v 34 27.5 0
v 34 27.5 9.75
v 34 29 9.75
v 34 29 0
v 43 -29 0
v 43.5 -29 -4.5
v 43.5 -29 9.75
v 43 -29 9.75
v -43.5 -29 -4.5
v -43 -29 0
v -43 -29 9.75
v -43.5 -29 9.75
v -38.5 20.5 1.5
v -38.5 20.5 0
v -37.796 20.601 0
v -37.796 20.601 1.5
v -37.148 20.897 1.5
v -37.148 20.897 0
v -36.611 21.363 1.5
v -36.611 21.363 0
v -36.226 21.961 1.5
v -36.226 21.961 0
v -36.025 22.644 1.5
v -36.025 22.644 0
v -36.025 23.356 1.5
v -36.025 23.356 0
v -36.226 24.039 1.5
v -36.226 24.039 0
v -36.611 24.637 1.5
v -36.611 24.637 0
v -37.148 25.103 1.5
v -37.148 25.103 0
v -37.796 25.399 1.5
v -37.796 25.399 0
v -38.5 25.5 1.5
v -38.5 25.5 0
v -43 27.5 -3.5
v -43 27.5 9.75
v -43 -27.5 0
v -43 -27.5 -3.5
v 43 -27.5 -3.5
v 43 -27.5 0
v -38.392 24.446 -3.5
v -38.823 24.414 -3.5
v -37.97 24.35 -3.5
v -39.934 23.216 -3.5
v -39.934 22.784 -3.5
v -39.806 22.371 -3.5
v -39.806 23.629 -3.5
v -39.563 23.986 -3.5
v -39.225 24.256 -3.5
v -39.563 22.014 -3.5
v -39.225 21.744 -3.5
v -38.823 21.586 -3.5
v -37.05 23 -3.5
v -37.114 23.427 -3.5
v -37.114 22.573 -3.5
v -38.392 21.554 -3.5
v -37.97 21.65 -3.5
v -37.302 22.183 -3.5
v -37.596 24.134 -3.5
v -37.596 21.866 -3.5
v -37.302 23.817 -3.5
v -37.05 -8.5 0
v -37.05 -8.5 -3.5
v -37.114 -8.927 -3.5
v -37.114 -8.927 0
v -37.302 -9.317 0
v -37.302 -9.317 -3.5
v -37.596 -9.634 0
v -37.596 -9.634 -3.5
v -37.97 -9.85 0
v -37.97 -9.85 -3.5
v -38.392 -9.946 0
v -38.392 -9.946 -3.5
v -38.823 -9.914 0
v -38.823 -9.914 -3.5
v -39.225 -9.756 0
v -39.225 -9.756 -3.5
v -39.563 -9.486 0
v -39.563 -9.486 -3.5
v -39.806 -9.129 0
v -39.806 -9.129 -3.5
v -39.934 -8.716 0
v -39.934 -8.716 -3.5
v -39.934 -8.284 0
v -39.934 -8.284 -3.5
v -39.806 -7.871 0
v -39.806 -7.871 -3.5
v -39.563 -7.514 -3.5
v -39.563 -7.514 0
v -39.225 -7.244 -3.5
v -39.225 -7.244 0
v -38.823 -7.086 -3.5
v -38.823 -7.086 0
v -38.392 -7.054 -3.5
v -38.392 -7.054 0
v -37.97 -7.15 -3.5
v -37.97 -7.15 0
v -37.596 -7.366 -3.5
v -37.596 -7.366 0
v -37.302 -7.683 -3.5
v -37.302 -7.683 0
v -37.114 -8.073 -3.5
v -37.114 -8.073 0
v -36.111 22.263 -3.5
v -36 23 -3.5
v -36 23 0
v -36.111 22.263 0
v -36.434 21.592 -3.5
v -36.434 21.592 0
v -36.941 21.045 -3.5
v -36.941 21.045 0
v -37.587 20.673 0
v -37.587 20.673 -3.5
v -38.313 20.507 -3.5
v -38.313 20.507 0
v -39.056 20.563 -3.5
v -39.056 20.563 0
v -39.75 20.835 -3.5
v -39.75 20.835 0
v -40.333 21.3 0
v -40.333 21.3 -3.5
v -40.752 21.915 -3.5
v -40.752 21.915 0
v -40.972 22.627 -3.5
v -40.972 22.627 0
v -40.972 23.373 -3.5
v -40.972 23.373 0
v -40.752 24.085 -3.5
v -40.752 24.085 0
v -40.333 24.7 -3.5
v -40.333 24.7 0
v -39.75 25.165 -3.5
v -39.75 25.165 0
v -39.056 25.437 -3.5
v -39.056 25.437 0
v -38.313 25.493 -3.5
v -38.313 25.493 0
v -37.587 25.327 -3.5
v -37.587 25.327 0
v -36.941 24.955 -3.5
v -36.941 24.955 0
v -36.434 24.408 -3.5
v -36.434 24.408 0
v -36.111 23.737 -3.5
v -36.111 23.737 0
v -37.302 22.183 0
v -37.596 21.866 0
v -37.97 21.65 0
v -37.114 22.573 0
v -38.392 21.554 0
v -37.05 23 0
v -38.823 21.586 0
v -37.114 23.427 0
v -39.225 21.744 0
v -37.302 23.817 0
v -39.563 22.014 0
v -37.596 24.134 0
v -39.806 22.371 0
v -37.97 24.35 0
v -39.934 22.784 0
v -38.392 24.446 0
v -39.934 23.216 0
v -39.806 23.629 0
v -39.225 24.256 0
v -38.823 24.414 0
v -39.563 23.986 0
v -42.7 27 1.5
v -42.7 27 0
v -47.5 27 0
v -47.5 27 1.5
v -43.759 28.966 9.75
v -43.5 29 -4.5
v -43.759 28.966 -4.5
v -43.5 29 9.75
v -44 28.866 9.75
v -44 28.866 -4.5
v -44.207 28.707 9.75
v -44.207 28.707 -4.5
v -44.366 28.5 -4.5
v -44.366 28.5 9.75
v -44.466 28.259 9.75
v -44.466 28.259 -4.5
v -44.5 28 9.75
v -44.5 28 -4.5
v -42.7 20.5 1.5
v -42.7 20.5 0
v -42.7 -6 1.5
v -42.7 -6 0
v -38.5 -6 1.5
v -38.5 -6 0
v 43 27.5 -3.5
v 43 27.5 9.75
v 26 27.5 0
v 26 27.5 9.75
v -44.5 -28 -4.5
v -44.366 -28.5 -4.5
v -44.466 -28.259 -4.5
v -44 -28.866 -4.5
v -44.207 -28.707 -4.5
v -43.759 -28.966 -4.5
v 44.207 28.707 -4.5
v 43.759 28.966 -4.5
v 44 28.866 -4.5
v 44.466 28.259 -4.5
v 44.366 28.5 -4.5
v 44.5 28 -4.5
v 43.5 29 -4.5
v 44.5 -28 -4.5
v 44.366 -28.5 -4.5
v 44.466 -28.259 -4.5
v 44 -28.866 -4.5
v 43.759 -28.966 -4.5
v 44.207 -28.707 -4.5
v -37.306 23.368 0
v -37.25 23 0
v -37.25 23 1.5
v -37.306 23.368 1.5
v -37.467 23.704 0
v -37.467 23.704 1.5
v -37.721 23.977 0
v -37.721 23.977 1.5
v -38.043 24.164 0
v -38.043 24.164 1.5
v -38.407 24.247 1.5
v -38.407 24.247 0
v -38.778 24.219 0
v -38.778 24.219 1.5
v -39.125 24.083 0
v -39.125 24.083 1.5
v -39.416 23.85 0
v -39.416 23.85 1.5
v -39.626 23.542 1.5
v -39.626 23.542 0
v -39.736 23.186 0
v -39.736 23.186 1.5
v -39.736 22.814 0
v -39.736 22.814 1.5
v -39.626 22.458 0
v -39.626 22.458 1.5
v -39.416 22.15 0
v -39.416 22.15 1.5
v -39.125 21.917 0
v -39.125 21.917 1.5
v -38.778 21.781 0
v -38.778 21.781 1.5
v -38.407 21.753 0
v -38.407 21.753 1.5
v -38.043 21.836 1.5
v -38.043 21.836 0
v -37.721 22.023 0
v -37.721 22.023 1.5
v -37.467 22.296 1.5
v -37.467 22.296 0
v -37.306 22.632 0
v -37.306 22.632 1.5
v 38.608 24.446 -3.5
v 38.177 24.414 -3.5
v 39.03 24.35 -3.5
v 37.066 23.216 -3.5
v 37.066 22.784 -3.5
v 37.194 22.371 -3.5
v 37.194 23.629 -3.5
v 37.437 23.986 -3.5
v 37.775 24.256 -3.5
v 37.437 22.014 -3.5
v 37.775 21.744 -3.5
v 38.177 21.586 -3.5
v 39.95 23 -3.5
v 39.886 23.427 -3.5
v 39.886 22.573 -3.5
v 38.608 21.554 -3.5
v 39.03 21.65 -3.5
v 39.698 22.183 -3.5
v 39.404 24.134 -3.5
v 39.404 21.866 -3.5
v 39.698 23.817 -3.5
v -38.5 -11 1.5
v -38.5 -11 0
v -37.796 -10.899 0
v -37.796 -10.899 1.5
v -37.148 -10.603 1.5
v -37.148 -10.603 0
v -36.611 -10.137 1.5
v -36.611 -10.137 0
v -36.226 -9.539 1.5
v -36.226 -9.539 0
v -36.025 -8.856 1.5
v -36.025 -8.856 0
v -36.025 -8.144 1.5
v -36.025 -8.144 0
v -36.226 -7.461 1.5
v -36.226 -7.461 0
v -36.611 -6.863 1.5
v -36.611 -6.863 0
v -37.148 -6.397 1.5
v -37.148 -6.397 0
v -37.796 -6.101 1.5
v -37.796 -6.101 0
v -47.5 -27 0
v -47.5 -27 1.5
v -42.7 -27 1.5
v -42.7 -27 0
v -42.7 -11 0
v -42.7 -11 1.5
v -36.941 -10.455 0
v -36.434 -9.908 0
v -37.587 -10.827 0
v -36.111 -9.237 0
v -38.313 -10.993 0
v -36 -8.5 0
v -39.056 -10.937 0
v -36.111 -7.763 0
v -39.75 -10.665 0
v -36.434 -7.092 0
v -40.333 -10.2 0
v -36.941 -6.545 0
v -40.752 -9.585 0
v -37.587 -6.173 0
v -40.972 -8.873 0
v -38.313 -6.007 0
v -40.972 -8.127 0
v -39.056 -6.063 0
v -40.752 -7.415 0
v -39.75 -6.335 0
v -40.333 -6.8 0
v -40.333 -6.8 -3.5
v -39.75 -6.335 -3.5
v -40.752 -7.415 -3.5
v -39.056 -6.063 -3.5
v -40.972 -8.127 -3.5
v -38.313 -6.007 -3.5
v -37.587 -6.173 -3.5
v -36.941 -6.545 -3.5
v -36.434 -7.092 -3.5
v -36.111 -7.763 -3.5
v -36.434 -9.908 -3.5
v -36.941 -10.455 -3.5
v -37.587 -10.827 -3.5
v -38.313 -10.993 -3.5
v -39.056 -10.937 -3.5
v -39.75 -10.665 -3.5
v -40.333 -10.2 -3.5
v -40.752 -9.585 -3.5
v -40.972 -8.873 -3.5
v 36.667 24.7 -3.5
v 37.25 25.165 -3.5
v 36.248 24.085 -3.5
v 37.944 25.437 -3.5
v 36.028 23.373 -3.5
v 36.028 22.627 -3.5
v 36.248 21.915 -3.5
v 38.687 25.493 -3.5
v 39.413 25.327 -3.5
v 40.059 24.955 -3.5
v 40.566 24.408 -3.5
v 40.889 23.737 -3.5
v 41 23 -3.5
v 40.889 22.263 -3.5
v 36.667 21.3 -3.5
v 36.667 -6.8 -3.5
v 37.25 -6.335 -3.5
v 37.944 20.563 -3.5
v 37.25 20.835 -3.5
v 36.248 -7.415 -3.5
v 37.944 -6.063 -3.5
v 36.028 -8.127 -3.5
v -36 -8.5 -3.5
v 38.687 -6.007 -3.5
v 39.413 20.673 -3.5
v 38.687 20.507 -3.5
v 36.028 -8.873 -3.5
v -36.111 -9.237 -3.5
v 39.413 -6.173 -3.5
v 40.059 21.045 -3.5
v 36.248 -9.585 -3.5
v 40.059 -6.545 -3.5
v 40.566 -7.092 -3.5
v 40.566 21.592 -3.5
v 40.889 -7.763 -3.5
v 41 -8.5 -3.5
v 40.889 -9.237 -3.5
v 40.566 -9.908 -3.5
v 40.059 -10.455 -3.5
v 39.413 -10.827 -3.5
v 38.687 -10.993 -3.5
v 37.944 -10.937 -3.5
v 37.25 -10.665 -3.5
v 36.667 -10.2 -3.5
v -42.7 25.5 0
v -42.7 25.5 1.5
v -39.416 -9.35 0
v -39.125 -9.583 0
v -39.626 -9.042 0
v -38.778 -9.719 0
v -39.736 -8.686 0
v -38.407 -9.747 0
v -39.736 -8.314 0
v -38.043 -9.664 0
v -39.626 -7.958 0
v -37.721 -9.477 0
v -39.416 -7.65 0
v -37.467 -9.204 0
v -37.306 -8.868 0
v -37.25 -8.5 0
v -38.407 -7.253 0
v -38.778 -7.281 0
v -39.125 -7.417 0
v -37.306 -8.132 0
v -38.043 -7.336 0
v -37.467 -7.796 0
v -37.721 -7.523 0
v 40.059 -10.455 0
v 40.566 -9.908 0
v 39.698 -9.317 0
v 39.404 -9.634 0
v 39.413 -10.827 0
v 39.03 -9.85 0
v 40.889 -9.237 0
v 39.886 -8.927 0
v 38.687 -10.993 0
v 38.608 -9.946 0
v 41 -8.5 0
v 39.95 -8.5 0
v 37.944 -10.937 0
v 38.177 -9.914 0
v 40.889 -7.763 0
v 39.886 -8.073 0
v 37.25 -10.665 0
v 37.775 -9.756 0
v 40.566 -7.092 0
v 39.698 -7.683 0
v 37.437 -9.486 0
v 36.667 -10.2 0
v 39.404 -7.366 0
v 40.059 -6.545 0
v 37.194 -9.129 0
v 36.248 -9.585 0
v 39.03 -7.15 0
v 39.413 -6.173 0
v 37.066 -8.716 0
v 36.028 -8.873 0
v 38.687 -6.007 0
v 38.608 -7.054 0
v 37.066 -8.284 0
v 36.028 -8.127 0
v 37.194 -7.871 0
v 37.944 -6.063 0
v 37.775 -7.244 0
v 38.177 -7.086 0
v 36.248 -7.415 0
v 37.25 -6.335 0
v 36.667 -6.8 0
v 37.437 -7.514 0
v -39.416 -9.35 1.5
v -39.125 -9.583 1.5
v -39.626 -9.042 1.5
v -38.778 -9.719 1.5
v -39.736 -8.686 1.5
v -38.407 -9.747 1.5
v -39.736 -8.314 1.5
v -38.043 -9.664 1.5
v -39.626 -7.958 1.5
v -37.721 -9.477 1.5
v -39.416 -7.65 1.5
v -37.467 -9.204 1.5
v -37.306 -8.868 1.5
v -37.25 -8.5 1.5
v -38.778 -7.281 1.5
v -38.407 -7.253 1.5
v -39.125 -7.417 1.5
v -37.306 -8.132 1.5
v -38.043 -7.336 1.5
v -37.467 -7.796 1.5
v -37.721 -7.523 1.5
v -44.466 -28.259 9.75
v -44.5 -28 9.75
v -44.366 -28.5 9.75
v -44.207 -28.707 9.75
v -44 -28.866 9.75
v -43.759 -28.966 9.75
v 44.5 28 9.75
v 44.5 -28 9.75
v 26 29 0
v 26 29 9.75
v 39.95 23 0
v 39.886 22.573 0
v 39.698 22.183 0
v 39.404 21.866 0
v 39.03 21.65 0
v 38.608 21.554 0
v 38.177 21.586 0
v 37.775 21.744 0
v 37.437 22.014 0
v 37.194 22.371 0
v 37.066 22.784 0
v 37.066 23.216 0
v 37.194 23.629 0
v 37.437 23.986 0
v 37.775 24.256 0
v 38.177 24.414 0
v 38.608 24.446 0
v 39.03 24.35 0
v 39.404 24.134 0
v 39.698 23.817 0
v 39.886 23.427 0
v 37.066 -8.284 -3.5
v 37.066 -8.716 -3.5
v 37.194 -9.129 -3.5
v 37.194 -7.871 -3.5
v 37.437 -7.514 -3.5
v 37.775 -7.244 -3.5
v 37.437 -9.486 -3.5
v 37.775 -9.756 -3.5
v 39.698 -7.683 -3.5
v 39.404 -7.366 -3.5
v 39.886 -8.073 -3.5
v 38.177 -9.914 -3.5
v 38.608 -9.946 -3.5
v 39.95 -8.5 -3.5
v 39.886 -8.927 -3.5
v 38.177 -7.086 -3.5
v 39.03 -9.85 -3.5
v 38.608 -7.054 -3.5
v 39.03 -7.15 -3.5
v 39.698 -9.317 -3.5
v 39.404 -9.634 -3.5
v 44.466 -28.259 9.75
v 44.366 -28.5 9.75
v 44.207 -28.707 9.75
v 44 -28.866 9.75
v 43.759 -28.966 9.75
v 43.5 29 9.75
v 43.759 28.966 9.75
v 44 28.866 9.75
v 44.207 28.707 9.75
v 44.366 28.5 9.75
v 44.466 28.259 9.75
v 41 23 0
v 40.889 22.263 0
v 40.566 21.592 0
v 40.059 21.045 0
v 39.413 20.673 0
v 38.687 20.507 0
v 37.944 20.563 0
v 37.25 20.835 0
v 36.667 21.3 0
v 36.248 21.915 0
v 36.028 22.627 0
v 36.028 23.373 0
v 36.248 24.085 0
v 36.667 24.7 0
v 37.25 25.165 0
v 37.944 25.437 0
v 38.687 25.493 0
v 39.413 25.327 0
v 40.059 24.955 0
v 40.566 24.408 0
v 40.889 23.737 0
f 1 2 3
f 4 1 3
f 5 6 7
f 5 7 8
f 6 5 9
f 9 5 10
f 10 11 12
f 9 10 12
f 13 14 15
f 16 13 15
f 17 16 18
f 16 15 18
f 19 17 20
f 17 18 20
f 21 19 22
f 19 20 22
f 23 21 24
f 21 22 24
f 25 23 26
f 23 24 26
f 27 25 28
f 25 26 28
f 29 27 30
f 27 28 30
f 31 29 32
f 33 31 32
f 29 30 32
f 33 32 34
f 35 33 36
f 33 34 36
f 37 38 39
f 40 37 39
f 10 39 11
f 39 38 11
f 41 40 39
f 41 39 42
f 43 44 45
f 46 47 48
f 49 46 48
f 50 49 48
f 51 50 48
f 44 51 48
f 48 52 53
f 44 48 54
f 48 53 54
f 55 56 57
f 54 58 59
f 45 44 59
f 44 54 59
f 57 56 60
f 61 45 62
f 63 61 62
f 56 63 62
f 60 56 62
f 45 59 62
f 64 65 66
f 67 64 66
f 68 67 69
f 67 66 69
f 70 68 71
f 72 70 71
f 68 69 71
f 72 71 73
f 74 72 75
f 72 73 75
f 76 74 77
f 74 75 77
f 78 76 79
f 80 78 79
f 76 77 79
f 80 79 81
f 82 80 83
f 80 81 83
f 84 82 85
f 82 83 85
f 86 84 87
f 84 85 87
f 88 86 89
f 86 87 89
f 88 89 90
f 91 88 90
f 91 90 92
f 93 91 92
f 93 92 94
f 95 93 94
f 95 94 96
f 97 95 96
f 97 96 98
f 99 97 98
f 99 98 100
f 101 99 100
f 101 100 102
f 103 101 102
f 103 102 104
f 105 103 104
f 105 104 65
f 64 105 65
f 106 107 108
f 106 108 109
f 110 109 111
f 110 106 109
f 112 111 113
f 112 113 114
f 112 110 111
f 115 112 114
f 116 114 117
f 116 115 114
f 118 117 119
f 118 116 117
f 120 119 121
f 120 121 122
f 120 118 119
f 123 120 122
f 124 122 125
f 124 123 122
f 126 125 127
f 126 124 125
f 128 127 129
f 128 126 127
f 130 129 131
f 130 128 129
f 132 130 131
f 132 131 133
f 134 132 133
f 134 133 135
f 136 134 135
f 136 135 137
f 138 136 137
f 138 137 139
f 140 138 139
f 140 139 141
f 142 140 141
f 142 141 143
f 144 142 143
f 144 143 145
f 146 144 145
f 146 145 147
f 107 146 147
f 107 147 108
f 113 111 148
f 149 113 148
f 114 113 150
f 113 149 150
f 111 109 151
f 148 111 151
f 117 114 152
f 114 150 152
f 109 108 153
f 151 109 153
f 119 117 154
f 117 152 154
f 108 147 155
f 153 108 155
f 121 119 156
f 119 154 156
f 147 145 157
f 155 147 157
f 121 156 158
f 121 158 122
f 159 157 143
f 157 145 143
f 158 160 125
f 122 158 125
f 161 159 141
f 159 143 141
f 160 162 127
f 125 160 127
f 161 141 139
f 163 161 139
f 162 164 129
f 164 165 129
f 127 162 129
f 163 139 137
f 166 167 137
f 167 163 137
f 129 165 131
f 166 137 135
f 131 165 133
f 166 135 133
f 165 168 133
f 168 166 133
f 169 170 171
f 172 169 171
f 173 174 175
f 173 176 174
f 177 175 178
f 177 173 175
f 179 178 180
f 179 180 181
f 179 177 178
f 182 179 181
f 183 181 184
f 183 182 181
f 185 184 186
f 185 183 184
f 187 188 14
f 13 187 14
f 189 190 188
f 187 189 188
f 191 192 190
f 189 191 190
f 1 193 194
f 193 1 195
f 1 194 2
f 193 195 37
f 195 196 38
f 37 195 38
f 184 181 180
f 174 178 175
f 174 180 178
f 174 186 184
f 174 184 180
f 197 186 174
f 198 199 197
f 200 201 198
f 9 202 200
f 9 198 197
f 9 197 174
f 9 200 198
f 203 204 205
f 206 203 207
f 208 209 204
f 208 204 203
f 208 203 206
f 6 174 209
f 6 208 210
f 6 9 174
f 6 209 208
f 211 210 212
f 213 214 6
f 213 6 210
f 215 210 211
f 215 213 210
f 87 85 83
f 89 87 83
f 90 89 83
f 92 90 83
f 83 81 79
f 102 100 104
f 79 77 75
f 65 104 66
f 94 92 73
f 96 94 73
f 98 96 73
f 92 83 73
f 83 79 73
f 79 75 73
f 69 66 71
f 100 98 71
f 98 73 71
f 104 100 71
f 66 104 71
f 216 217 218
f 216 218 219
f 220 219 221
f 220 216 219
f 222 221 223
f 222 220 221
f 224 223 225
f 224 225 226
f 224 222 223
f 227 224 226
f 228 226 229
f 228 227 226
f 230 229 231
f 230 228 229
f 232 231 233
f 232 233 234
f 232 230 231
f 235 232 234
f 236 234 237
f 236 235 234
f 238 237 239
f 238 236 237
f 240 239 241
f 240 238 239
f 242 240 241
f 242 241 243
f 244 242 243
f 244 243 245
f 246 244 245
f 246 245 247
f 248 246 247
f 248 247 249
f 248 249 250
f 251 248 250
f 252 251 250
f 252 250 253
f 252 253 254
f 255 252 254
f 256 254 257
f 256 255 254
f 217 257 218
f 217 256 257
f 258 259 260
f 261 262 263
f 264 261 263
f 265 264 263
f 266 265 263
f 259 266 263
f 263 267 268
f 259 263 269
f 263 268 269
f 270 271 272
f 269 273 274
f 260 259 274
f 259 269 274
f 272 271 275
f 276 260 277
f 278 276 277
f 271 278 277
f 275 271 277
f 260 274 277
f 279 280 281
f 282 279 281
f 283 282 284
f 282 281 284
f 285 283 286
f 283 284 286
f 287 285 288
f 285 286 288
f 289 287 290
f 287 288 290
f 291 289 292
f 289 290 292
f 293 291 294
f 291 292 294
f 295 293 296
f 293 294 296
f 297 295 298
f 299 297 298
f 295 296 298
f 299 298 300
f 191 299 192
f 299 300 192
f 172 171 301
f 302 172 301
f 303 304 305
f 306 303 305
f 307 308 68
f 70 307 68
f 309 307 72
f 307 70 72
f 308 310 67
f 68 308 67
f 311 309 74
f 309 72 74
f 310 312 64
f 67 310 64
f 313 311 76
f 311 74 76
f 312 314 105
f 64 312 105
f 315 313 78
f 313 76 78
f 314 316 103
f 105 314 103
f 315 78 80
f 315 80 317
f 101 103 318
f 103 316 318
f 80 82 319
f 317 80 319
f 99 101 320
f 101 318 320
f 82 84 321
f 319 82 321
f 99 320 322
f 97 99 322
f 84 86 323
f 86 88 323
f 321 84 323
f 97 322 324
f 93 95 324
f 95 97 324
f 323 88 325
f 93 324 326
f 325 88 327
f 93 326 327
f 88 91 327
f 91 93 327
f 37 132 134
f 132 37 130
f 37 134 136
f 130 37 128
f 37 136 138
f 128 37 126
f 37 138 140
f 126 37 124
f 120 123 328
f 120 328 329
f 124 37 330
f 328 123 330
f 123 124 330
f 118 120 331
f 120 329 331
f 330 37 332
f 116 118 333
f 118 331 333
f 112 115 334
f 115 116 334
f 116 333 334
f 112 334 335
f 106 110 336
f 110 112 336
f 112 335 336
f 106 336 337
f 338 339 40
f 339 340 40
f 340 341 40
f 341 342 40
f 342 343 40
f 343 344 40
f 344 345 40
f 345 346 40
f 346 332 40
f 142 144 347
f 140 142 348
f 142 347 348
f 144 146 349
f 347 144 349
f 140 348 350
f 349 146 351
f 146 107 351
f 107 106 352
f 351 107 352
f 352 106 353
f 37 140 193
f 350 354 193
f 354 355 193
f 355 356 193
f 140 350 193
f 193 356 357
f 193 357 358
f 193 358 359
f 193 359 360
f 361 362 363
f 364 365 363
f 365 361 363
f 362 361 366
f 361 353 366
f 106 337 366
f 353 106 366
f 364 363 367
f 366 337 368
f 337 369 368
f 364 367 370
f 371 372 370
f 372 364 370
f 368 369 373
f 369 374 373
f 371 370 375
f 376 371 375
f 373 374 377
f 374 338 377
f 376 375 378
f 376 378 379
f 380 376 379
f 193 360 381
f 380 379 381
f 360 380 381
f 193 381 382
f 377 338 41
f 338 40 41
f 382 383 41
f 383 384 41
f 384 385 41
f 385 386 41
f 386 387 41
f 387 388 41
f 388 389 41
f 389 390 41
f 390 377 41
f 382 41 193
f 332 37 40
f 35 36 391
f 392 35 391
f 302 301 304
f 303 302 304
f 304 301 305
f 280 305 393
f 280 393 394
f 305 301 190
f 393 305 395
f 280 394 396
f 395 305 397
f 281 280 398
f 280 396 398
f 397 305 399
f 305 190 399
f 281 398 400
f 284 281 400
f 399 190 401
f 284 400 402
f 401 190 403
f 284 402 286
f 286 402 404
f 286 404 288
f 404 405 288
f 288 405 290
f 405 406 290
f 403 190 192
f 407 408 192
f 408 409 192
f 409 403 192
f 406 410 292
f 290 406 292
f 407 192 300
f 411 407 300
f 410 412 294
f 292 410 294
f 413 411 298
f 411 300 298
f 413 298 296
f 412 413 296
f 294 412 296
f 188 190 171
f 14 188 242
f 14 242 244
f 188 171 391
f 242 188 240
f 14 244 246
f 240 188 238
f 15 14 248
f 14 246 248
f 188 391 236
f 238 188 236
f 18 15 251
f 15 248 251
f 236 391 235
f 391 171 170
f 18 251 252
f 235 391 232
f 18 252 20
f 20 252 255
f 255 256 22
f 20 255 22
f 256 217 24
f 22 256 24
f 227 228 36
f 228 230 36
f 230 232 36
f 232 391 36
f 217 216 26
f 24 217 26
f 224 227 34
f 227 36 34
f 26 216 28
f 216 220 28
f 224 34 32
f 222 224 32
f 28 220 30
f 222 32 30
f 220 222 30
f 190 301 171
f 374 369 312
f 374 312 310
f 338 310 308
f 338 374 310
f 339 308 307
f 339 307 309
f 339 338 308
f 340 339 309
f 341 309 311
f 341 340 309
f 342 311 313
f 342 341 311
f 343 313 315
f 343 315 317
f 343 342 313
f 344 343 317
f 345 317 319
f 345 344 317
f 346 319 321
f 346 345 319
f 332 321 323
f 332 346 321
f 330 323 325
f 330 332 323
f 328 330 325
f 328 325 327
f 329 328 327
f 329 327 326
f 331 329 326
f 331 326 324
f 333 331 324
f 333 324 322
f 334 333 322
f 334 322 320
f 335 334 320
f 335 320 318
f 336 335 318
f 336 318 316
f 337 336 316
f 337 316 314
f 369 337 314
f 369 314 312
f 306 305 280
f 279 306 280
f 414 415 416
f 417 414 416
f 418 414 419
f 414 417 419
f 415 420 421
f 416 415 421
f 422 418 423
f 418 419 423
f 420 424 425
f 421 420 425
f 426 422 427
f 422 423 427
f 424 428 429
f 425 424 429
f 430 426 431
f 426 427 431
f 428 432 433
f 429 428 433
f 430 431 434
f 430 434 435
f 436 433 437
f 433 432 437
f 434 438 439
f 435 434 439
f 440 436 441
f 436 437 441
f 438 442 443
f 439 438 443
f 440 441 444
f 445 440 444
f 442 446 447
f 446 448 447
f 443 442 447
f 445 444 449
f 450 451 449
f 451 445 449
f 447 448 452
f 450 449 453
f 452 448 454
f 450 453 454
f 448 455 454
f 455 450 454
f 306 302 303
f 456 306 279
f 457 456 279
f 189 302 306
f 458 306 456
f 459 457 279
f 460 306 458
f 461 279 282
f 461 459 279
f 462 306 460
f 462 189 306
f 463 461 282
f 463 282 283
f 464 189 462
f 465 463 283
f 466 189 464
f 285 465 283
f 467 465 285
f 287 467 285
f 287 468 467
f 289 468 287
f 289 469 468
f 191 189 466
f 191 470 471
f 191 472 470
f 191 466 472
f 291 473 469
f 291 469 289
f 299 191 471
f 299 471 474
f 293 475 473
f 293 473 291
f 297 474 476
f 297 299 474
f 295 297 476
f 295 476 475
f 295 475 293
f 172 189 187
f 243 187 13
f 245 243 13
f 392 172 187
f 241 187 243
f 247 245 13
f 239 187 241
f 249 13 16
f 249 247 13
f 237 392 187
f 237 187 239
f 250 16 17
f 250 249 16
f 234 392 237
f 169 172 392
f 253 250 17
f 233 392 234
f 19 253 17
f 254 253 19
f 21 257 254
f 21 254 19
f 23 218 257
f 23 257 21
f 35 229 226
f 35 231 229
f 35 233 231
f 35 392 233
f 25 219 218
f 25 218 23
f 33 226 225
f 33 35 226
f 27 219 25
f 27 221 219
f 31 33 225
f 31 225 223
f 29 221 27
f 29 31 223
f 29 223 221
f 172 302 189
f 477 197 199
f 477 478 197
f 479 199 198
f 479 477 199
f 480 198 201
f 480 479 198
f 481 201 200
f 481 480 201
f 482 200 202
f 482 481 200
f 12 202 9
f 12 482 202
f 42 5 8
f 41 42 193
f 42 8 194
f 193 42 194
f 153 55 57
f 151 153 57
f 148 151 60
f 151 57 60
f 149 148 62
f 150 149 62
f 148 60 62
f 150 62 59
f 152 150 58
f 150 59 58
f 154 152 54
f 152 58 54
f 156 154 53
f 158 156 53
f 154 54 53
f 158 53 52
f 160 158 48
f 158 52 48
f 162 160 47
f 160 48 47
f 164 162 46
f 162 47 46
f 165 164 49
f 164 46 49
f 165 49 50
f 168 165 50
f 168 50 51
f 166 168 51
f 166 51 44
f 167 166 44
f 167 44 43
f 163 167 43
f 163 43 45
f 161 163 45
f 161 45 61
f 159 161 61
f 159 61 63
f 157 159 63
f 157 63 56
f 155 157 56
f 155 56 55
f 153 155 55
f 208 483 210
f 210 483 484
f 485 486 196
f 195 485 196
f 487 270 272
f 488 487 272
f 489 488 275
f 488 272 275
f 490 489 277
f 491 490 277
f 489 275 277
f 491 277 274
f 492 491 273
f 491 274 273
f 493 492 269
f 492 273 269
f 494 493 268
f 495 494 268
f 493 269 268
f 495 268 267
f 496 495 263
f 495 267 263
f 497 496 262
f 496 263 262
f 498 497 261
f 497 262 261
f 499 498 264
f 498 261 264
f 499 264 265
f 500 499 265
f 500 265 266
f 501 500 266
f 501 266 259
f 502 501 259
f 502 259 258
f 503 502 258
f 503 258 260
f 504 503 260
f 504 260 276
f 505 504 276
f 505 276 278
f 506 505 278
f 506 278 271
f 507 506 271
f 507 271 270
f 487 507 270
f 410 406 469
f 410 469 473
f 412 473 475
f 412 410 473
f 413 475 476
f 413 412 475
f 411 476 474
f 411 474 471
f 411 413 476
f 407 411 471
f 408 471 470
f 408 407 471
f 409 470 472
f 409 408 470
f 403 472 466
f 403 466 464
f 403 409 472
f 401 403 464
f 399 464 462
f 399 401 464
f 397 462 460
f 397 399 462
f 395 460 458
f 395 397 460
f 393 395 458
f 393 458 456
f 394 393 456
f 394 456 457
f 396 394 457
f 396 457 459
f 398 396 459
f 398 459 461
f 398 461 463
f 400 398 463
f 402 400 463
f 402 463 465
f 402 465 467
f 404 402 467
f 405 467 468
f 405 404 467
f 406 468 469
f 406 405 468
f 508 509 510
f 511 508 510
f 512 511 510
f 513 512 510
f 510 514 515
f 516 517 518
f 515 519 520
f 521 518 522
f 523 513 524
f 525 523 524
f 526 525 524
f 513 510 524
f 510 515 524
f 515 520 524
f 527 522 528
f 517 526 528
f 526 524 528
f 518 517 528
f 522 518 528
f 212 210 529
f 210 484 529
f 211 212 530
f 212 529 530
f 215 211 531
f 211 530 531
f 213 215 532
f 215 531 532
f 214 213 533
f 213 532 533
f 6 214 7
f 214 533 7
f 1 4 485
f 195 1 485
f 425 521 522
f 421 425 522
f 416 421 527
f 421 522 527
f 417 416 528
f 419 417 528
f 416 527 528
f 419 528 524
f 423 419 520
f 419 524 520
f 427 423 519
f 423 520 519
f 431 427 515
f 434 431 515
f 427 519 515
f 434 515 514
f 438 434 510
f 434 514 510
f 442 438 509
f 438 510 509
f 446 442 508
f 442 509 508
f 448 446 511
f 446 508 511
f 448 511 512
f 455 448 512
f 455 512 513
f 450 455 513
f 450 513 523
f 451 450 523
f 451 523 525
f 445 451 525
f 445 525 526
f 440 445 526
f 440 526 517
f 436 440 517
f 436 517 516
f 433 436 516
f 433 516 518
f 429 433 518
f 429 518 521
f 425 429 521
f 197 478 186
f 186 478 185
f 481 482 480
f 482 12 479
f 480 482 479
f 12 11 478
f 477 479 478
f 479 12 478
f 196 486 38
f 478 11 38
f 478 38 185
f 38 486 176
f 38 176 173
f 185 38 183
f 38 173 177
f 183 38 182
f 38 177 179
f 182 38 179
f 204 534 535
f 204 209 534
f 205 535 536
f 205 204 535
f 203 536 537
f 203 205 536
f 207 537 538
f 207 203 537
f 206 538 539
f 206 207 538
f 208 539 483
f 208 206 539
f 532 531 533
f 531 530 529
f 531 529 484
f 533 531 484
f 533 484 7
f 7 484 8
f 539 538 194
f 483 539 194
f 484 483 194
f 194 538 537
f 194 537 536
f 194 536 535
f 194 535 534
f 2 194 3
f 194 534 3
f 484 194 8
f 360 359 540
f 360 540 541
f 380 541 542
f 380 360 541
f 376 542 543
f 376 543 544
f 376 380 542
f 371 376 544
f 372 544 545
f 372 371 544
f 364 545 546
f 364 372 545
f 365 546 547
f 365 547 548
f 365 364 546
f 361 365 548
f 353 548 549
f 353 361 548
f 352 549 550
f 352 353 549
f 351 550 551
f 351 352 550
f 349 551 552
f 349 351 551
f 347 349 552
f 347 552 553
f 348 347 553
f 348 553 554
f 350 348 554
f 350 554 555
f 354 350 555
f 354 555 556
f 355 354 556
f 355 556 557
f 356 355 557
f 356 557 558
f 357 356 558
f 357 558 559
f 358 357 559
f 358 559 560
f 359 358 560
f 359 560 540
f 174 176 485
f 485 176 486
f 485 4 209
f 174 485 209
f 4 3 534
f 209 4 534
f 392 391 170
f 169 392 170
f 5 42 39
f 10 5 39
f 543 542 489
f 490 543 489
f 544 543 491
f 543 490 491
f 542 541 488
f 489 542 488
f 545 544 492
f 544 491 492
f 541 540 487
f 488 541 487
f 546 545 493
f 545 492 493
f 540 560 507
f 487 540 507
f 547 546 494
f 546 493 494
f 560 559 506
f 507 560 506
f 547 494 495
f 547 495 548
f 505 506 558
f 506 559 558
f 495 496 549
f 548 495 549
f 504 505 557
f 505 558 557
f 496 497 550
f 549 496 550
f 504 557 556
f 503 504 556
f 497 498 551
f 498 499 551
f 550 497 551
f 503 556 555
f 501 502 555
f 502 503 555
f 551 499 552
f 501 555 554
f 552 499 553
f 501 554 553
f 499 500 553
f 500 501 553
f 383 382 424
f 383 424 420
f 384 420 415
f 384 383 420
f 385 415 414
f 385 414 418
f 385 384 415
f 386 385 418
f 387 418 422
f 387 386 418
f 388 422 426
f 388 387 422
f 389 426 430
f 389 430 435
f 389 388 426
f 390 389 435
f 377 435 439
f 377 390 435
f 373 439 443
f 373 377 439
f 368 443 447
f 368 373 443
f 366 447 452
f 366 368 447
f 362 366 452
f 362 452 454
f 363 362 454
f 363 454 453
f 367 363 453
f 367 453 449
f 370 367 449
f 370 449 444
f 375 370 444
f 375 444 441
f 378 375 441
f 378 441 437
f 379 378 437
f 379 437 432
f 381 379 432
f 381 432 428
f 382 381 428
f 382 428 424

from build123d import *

# Parameters (mm, degrees)
F2_W      = 86
F2_H      = 1.5
F2_W_2    = 8
F3_DEPTH  = 1
F5_R      = 2.5
F5_R_2    = 1.45
F8_R      = 1
F9_R      = 1.25
F10_DEPTH = 1.5


with BuildPart() as f3:
    # F2 (on line) → F3 (new body)
    with BuildSketch(Plane(origin=(0, 0, -3.5), x_dir=(1, 0, 0), z_dir=(0, 0, -1))):
        Polygon((34, -27.5), (43, -27.5), (43, 27.5), (-43, 27.5), (-43, -27.5), (26, -27.5), align=None)
        with Locations((0, 28.25)):
            Rectangle(F2_W, F2_H)
        Polygon((26, -29), (26, -27.5), (-43, -27.5), (-43, 27.5), (-43, 29), (-44.5, 29), (-44.5, -29), align=None)
        with Locations((30, -28.25)):
            Rectangle(F2_W_2, F2_H)
        Polygon((43, 27.5), (43, -27.5), (34, -27.5), (34, -29), (44.5, -29), (44.5, 29), (43, 29), align=None)
    extrude(amount=F3_DEPTH)

    # F4: sweep along a path in F0
    with BuildLine(Plane.XZ) as f4_path:
        Line((0, -3.5), (0, 0))
        Line((0, 0), (0, 1.25))
        Line((0, 1.25), (0, 9.75))
    # F2 (on line) → F4 (sweep)
    with BuildSketch(Plane(origin=(0, 0, -3.5), x_dir=(1, 0, 0), z_dir=(0, 0, -1))):
        Polygon((26, -29), (26, -27.5), (-43, -27.5), (-43, 27.5), (-43, 29), (-44.5, 29), (-44.5, -29), align=None)
        Polygon((43, 27.5), (43, -27.5), (34, -27.5), (34, -29), (44.5, -29), (44.5, 29), (43, 29), align=None)
    sweep(path=f4_path.line)

    # F6: sweep along a path in F0
    with BuildLine(Plane.XZ) as f6_path:
        Line((0, 0), (0, -3.5))
    # F5 (on line) → F6 (sweep)
    with BuildSketch(Plane(origin=(0, 0, -3.5), x_dir=(1, 0, 0), z_dir=(0, 0, -1))):
        with Locations((-38.5, -23)):
            Circle(F5_R)
        with Locations((-38.5, -23)):
            Circle(F5_R_2, mode=Mode.SUBTRACT)
        with Locations((-38.5, 8.5)):
            Circle(F5_R)
        with Locations((-38.5, 8.5)):
            Circle(F5_R_2, mode=Mode.SUBTRACT)
        with Locations((38.5, 8.5)):
            Circle(F5_R)
        with Locations((38.5, 8.5)):
            Circle(F5_R_2, mode=Mode.SUBTRACT)
        with Locations((38.5, -23)):
            Circle(F5_R)
        with Locations((38.5, -23)):
            Circle(F5_R_2, mode=Mode.SUBTRACT)
    sweep(path=f6_path.line)

    # F7: sweep along a path in F0
    with BuildLine(Plane.XZ) as f7_path:
        Line((0, 0), (0, -3.5))
    # F2 (on line) → F7 (sweep)
    with BuildSketch(Plane(origin=(0, 0, -3.5), x_dir=(1, 0, 0), z_dir=(0, 0, -1))):
        with Locations((0, 28.25)):
            Rectangle(F2_W, F2_H)
        with Locations((30, -28.25)):
            Rectangle(F2_W_2, F2_H)
    sweep(path=f7_path.line)

    # F8
    f8_edges = [f3.edges().sort_by_distance(p)[0] for p in [
        (44.5, -29, 2.625),
        (44.5, 29, 2.625),
        (-44.5, -29, 2.625),
        (-44.5, 29, 2.625),
    ]]
    fillet(f8_edges, radius=F8_R)


with BuildPart() as f10:
    # F9 (on Top) → F10 (new body)
    with BuildSketch(Plane.XY):
        Polygon((-42.7, 25.5), (-42.7, 27), (-47.5, 27), (-47.5, -27), (-42.7, -27), (-42.7, -11), (-42.7, -6), (-42.7, 20.5), align=None)
        with BuildLine():
            Line((-38.5, 25.5), (-42.7, 25.5))
            Line((-42.7, 25.5), (-42.7, 20.5))
            Line((-42.7, 20.5), (-38.5, 20.5))
            ThreePointArc((-38.5, 20.5), (-36, 23), (-38.5, 25.5))
        make_face()
        with Locations((-38.5, 23)):
            Circle(F9_R, mode=Mode.SUBTRACT)
        with BuildLine():
            Line((-38.5, -6), (-42.7, -6))
            Line((-42.7, -6), (-42.7, -11))
            Line((-42.7, -11), (-38.5, -11))
            ThreePointArc((-38.5, -11), (-36, -8.5), (-38.5, -6))
        make_face()
        with Locations((-38.5, -8.5)):
            Circle(F9_R, mode=Mode.SUBTRACT)
    extrude(amount=F10_DEPTH)


solid = Compound([f3.part, f10.part])
